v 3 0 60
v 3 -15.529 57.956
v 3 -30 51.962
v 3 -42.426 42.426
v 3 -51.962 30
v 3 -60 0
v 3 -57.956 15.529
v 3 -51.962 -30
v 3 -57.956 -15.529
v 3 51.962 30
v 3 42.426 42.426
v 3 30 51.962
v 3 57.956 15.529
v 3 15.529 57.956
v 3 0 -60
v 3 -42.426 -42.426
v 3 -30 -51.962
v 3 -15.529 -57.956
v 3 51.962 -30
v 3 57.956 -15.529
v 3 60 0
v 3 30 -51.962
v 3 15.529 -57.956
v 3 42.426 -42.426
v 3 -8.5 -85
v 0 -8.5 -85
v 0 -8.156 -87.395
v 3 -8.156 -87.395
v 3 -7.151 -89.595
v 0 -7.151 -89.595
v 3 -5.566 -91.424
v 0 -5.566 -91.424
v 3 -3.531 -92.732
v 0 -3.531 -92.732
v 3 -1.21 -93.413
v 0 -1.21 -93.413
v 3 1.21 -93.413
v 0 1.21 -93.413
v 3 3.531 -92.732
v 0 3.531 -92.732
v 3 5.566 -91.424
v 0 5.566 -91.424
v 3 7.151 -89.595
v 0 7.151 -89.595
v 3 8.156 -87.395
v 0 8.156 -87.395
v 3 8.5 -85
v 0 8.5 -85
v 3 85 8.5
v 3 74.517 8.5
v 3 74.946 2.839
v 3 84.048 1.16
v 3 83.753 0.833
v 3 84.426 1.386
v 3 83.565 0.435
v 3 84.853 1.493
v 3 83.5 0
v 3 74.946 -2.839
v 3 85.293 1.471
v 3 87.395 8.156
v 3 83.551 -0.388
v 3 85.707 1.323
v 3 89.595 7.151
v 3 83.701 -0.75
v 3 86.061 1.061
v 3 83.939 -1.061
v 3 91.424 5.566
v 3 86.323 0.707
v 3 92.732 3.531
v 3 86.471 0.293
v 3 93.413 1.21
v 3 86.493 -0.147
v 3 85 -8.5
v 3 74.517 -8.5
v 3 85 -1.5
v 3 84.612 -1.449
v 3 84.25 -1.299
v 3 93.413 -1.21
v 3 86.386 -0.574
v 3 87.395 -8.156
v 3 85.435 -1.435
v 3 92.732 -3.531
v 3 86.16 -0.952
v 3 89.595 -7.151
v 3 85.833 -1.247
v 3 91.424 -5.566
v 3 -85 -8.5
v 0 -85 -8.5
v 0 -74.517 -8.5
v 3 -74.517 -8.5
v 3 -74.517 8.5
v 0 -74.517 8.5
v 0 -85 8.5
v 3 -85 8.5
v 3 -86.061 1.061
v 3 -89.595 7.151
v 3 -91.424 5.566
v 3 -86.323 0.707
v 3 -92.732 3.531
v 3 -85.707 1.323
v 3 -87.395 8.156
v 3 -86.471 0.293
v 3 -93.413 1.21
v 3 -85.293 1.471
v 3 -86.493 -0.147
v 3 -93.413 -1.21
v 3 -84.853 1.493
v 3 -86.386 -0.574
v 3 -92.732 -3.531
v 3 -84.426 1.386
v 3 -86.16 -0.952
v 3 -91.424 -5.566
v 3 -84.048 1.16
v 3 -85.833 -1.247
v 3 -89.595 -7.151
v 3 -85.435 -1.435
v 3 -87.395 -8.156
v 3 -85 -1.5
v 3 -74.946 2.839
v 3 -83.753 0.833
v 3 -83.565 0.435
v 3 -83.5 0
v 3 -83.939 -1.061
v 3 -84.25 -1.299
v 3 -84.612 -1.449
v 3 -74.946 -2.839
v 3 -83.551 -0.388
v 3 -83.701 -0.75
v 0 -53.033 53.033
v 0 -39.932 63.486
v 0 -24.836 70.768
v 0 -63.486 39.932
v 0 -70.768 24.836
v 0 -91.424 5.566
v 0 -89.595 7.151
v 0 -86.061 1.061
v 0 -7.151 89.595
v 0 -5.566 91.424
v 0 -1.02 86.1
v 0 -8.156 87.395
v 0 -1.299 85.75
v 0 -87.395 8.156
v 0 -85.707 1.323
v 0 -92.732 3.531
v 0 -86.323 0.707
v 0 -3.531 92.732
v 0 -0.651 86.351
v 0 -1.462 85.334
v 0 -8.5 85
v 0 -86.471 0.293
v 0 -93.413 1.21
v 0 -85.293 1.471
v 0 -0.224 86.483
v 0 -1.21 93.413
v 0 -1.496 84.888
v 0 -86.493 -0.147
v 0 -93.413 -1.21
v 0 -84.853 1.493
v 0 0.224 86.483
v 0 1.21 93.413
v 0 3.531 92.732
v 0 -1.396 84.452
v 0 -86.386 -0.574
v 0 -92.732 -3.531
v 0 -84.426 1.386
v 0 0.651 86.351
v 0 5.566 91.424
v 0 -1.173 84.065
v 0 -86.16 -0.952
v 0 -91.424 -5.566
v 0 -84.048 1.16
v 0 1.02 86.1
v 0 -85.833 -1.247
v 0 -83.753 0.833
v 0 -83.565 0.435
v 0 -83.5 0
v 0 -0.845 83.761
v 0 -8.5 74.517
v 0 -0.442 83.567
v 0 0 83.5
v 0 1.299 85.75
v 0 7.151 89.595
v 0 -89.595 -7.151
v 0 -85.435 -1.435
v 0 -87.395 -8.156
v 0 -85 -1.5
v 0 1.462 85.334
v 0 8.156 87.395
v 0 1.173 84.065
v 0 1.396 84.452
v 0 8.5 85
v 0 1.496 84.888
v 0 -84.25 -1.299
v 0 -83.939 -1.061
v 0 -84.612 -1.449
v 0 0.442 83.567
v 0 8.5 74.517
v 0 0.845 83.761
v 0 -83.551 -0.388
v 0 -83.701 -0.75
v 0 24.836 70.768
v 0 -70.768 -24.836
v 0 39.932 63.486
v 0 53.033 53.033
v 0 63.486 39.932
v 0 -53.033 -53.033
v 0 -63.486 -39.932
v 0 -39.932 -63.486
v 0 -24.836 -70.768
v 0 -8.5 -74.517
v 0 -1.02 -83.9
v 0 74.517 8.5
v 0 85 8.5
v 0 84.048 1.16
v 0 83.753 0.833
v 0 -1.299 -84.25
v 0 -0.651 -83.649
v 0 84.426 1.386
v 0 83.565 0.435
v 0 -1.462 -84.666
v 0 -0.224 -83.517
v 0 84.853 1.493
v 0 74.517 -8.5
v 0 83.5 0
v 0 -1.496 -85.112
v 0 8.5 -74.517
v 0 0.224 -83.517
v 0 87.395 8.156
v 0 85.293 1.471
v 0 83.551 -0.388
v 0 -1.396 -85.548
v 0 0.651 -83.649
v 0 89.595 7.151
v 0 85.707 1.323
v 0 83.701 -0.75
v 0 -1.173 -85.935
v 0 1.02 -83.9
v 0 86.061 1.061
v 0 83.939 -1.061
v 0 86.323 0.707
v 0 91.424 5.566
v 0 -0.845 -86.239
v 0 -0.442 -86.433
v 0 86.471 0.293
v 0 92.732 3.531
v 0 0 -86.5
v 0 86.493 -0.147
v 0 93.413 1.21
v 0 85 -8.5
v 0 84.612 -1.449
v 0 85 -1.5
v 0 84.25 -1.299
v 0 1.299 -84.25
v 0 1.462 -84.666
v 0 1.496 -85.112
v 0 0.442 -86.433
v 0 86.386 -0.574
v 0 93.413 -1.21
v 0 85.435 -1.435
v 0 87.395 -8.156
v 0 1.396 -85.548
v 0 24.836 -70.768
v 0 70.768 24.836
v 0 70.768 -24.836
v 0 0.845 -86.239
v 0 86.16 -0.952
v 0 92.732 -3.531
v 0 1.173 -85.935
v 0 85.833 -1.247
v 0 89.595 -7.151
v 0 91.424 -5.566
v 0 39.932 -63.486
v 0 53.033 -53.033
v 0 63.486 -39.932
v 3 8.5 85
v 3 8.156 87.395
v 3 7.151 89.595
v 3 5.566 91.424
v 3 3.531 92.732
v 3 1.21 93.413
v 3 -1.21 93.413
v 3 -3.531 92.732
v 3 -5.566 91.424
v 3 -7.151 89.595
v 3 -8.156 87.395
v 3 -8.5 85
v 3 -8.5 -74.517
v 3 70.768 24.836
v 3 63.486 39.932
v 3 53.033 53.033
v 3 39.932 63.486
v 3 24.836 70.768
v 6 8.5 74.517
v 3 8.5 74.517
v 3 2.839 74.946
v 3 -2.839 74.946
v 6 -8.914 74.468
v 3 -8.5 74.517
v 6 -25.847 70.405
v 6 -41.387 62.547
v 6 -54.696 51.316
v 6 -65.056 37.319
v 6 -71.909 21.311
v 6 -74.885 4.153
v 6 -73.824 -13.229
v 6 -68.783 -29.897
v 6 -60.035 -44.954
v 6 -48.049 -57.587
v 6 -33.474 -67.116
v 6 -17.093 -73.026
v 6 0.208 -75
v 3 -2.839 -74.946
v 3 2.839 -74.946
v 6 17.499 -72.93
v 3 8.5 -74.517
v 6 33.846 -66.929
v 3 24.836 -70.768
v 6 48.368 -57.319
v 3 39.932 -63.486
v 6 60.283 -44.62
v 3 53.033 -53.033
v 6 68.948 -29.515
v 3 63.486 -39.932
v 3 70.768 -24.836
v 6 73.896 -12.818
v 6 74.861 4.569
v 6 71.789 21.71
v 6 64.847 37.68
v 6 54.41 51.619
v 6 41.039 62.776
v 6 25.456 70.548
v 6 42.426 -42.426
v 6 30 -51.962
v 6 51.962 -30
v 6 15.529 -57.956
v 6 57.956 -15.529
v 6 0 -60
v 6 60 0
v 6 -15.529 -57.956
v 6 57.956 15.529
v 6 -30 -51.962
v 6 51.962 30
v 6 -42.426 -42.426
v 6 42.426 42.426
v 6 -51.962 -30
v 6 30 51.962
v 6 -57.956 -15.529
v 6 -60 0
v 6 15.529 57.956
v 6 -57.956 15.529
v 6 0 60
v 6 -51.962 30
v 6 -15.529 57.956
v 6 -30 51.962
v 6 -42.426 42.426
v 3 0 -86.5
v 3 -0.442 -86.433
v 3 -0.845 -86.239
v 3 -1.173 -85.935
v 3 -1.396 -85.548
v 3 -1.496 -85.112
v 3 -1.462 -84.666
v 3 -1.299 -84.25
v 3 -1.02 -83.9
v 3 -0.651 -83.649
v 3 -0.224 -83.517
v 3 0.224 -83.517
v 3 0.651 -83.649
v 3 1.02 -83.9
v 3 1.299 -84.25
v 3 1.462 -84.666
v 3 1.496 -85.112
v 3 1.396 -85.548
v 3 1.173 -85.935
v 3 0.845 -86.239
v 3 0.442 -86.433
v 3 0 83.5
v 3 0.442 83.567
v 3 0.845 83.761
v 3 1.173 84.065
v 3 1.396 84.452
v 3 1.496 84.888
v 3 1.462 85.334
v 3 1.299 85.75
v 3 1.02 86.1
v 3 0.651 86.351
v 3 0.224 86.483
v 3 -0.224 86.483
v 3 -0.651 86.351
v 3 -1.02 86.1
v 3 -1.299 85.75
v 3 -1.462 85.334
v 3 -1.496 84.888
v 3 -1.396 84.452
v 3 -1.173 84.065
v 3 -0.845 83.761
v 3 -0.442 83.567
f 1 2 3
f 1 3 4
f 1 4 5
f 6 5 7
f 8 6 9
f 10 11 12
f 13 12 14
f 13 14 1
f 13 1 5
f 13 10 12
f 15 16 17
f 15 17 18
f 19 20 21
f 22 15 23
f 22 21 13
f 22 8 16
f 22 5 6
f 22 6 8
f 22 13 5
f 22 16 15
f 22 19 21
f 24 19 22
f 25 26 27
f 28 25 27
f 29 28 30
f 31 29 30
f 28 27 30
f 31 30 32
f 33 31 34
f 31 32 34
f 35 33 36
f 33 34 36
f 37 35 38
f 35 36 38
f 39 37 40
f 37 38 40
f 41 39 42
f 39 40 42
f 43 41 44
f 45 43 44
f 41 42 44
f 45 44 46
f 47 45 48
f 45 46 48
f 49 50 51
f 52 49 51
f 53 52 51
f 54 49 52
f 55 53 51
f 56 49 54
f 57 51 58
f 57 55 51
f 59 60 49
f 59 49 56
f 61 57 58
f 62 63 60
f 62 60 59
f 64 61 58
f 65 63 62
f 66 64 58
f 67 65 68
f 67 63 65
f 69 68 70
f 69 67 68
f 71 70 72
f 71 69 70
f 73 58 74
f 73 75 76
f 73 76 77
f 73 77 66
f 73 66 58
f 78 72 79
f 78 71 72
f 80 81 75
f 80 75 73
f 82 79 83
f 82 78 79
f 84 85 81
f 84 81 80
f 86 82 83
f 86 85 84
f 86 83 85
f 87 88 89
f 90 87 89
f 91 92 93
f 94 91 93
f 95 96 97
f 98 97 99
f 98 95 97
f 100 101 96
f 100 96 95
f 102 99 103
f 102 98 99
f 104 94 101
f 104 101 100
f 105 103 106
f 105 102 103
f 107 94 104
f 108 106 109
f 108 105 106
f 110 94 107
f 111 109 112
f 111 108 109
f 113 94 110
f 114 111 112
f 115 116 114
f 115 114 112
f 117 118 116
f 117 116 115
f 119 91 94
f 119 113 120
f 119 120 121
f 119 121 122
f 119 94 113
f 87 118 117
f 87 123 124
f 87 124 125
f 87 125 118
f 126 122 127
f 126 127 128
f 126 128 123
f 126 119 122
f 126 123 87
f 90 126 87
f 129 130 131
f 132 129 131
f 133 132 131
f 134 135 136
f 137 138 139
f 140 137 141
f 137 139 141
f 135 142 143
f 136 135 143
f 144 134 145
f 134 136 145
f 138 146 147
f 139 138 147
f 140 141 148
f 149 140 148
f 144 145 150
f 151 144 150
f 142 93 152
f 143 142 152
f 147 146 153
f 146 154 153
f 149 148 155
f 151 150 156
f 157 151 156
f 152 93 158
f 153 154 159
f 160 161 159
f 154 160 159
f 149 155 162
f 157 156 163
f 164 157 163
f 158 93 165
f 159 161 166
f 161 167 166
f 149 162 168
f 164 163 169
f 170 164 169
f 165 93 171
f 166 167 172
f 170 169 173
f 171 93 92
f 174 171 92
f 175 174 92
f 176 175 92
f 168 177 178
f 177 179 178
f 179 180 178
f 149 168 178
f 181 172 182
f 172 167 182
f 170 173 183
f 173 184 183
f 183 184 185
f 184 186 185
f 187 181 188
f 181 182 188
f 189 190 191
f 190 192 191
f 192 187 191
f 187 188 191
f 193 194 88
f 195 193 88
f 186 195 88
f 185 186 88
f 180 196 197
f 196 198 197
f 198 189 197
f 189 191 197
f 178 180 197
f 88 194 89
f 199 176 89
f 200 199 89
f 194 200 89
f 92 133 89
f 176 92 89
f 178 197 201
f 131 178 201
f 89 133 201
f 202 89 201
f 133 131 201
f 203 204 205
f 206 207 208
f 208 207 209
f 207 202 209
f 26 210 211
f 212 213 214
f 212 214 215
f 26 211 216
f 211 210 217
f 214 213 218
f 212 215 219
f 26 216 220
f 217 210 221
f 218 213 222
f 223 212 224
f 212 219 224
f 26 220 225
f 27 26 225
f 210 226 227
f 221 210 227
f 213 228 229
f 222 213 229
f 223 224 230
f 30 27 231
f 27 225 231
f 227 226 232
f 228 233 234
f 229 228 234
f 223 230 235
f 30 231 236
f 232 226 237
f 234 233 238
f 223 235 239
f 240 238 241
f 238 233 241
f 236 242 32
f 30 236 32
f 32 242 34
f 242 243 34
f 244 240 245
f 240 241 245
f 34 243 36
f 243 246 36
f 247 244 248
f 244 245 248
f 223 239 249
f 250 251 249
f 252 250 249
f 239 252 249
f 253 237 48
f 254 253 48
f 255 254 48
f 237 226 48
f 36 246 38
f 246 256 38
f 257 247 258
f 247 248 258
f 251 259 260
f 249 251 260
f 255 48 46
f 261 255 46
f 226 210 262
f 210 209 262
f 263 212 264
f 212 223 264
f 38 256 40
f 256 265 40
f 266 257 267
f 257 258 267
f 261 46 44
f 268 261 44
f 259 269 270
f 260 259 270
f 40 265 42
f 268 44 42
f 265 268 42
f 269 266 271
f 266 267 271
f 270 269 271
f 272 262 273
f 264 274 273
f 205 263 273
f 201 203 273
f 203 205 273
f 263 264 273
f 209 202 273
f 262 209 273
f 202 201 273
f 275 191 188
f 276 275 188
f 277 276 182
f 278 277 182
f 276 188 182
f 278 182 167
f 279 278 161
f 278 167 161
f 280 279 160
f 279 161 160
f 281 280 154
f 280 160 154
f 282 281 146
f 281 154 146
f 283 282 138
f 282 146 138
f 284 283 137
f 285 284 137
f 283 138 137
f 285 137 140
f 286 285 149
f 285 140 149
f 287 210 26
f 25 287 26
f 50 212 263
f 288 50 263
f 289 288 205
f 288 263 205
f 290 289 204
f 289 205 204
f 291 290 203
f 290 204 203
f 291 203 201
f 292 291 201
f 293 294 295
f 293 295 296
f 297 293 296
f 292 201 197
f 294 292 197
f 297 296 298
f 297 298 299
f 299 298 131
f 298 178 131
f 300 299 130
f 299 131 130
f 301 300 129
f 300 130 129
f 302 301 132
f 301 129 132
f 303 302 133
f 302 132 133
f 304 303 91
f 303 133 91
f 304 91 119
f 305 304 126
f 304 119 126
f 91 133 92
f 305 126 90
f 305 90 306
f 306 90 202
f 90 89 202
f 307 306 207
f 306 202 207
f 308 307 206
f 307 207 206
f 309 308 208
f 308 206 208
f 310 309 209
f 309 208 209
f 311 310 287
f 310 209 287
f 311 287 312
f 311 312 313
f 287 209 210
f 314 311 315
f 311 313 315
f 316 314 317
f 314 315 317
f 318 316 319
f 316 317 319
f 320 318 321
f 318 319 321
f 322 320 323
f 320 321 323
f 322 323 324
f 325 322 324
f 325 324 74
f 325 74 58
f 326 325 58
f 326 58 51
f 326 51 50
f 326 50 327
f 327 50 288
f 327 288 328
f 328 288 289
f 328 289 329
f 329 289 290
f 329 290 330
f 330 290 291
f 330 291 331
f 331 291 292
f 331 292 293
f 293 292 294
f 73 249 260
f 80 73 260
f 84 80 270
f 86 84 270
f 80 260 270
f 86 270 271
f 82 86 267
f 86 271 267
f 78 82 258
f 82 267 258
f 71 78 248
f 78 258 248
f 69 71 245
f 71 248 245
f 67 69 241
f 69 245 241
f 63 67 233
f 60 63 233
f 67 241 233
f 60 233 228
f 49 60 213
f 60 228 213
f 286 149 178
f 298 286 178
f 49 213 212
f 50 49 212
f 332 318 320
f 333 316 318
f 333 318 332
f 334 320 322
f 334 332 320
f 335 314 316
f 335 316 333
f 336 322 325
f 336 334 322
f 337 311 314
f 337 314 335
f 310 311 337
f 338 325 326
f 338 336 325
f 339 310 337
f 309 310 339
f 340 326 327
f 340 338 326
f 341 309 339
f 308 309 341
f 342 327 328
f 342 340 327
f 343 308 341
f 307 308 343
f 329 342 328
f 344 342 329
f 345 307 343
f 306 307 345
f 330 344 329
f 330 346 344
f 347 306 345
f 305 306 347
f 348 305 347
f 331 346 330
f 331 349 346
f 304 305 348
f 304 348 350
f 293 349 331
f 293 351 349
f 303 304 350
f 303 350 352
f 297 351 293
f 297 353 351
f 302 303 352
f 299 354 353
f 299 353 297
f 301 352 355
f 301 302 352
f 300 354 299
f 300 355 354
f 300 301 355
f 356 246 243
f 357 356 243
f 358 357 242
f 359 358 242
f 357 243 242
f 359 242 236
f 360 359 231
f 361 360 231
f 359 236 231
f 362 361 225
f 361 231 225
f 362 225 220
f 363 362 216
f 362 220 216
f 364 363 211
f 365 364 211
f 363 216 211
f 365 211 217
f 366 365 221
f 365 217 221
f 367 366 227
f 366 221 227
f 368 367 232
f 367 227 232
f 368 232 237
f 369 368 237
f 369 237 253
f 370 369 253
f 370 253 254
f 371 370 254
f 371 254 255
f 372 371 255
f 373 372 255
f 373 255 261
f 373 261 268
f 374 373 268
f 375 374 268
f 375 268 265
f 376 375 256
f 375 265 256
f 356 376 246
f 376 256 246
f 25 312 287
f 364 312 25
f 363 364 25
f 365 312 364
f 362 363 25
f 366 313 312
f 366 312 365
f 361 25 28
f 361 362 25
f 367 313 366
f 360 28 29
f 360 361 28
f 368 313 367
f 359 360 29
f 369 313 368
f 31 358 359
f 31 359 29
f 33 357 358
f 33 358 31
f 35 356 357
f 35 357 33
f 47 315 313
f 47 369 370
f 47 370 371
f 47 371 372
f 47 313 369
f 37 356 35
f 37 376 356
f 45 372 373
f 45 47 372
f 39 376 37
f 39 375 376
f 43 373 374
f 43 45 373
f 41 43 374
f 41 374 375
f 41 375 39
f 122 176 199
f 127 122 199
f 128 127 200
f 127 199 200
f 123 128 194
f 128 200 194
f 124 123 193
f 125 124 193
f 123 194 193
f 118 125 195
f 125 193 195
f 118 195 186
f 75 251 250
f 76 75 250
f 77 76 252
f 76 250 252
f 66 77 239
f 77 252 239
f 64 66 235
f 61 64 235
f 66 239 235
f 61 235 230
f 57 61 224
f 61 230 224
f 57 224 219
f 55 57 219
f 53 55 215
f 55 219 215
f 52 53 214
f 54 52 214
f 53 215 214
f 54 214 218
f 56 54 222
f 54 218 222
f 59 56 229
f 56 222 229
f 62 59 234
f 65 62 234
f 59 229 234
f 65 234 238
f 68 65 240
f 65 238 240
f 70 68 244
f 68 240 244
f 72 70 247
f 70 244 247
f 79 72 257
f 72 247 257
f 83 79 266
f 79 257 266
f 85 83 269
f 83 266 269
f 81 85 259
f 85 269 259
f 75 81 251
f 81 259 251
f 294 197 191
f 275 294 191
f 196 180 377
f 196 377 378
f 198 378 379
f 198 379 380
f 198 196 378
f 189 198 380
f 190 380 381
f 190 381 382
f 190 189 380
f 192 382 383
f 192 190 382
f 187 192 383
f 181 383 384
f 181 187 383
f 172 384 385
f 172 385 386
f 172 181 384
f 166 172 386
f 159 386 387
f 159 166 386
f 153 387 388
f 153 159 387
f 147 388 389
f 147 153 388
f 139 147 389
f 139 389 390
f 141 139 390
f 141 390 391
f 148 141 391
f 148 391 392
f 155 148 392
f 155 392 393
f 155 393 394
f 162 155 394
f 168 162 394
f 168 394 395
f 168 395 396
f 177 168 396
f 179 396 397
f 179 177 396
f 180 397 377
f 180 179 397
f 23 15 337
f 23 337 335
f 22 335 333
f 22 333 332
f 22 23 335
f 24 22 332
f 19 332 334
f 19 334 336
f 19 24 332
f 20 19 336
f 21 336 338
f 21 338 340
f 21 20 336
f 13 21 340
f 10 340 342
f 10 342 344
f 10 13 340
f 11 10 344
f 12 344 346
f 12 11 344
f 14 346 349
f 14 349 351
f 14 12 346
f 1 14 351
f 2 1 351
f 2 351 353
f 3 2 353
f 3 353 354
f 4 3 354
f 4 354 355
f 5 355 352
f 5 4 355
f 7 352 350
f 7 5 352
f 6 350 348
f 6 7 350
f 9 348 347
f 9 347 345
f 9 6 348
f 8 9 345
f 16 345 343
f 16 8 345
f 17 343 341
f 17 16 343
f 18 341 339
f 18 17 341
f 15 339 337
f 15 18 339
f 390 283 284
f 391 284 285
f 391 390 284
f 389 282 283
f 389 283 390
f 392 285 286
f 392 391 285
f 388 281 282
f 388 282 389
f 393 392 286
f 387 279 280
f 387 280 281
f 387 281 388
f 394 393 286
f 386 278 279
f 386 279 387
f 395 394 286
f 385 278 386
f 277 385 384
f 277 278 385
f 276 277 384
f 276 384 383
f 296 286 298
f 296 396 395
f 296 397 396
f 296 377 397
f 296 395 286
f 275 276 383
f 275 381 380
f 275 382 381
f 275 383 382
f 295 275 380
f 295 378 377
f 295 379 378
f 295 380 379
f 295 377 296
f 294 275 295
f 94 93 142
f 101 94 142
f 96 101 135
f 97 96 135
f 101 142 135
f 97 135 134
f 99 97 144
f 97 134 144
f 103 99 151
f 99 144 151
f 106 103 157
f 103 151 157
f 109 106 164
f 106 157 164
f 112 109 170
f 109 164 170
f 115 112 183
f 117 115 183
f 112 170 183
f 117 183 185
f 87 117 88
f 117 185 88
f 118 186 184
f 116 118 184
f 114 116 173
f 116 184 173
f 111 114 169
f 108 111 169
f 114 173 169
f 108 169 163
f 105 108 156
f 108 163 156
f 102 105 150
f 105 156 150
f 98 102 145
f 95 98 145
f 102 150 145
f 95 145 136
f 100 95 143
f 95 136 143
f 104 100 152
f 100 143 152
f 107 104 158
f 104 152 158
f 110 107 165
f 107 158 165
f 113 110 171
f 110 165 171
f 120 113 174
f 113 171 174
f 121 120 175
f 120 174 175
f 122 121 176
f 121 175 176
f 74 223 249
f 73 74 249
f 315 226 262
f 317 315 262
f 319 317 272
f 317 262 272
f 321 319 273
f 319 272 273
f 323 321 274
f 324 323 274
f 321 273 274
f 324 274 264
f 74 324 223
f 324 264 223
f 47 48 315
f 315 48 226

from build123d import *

# Parameters (mm, degrees)
SKETCH_1_R      = 75
SKETCH_1_R_2    = 1.5
EXTRUDE_1_DEPTH = 3
SKETCH_2_R      = 75
SKETCH_2_R_2    = 60
EXTRUDE_2_DEPTH = 3


with BuildPart() as part:
    # Эскиз1 → Бобышка-Вытянуть1 (new body)
    # profile 1 of 5: a face of its own
    with BuildSketch(Plane(origin=(0, 0, 0), x_dir=(0, 0, -1), z_dir=(1, 0, 0))):
        Circle(SKETCH_1_R)
    # profile 2 of 5: a face of its own
    with BuildSketch(Plane(origin=(0, 0, 0), x_dir=(0, 0, -1), z_dir=(1, 0, 0))):
        with BuildLine():
            ThreePointArc((-8.5, 74.516776635), (0, 75), (8.5, 74.516776635))
            Line((8.5, 74.516776635), (8.5, 85))
            ThreePointArc((8.5, 85), (0, 93.5), (-8.5, 85))
            Line((-8.5, 85), (-8.5, 74.516776635))
        make_face()
        with BuildLine():
            ThreePointArc((0, 83.5), (-1.060660172, 86.060660172), (1.5, 85))
            ThreePointArc((1.5, 85), (1.060660172, 83.939339828), (0, 83.5))
        make_face(mode=Mode.SUBTRACT)
    # profile 3 of 5: a face of its own
    with BuildSketch(Plane(origin=(0, 0, 0), x_dir=(0, 0, -1), z_dir=(1, 0, 0))):
        with BuildLine():
            ThreePointArc((85, -8.5), (93.5, 0), (85, 8.5))
            Line((85, 8.5), (74.516776635, 8.5))
            ThreePointArc((74.516776635, 8.5), (74.879096708, 4.256862249), (75, 0))
            ThreePointArc((75, 0), (74.879096708, -4.256862249), (74.516776635, -8.5))
            Line((74.516776635, -8.5), (85, -8.5))
        make_face()
        with BuildLine():
            ThreePointArc((83.5, 0), (85, 1.5), (86.5, 0))
            ThreePointArc((86.5, 0), (85, -1.5), (83.5, 0))
        make_face(mode=Mode.SUBTRACT)
    # profile 4 of 5: a face of its own
    with BuildSketch(Plane(origin=(0, 0, 0), x_dir=(0, 0, -1), z_dir=(1, 0, 0))):
        with BuildLine():
            Line((8.5, -85), (8.5, -74.516776635))
            ThreePointArc((8.5, -74.516776635), (0, -75), (-8.5, -74.516776635))
            Line((-8.5, -74.516776635), (-8.5, -85))
            ThreePointArc((-8.5, -85), (0, -93.5), (8.5, -85))
        make_face()
        with BuildLine():
            ThreePointArc((0, -83.5), (1.060660172, -83.939339828), (1.5, -85))
            ThreePointArc((1.5, -85), (-1.060660172, -86.060660172), (0, -83.5))
        make_face(mode=Mode.SUBTRACT)
    # profile 5 of 5: a face of its own
    with BuildSketch(Plane(origin=(0, 0, 0), x_dir=(0, 0, -1), z_dir=(1, 0, 0))):
        with BuildLine():
            ThreePointArc((-74.516776635, -8.5), (-75, 0), (-74.516776635, 8.5))
            Line((-74.516776635, 8.5), (-85, 8.5))
            ThreePointArc((-85, 8.5), (-93.5, 0), (-85, -8.5))
            Line((-85, -8.5), (-74.516776635, -8.5))
        make_face()
        with Locations((-85, 0)):
            Circle(SKETCH_1_R_2, mode=Mode.SUBTRACT)
    extrude(amount=EXTRUDE_1_DEPTH)

    # Эскиз2 → Бобышка-Вытянуть2 (add)
    with BuildSketch(Plane(origin=(3, 0, 0), x_dir=(0, 0, -1), z_dir=(1, 0, 0))):
        with Locations(Location((0, 0, 0), (0, 0, 173.492496408))):
            Circle(SKETCH_2_R)
        Circle(SKETCH_2_R_2, mode=Mode.SUBTRACT)
    extrude(amount=EXTRUDE_2_DEPTH)


solid = part.part
